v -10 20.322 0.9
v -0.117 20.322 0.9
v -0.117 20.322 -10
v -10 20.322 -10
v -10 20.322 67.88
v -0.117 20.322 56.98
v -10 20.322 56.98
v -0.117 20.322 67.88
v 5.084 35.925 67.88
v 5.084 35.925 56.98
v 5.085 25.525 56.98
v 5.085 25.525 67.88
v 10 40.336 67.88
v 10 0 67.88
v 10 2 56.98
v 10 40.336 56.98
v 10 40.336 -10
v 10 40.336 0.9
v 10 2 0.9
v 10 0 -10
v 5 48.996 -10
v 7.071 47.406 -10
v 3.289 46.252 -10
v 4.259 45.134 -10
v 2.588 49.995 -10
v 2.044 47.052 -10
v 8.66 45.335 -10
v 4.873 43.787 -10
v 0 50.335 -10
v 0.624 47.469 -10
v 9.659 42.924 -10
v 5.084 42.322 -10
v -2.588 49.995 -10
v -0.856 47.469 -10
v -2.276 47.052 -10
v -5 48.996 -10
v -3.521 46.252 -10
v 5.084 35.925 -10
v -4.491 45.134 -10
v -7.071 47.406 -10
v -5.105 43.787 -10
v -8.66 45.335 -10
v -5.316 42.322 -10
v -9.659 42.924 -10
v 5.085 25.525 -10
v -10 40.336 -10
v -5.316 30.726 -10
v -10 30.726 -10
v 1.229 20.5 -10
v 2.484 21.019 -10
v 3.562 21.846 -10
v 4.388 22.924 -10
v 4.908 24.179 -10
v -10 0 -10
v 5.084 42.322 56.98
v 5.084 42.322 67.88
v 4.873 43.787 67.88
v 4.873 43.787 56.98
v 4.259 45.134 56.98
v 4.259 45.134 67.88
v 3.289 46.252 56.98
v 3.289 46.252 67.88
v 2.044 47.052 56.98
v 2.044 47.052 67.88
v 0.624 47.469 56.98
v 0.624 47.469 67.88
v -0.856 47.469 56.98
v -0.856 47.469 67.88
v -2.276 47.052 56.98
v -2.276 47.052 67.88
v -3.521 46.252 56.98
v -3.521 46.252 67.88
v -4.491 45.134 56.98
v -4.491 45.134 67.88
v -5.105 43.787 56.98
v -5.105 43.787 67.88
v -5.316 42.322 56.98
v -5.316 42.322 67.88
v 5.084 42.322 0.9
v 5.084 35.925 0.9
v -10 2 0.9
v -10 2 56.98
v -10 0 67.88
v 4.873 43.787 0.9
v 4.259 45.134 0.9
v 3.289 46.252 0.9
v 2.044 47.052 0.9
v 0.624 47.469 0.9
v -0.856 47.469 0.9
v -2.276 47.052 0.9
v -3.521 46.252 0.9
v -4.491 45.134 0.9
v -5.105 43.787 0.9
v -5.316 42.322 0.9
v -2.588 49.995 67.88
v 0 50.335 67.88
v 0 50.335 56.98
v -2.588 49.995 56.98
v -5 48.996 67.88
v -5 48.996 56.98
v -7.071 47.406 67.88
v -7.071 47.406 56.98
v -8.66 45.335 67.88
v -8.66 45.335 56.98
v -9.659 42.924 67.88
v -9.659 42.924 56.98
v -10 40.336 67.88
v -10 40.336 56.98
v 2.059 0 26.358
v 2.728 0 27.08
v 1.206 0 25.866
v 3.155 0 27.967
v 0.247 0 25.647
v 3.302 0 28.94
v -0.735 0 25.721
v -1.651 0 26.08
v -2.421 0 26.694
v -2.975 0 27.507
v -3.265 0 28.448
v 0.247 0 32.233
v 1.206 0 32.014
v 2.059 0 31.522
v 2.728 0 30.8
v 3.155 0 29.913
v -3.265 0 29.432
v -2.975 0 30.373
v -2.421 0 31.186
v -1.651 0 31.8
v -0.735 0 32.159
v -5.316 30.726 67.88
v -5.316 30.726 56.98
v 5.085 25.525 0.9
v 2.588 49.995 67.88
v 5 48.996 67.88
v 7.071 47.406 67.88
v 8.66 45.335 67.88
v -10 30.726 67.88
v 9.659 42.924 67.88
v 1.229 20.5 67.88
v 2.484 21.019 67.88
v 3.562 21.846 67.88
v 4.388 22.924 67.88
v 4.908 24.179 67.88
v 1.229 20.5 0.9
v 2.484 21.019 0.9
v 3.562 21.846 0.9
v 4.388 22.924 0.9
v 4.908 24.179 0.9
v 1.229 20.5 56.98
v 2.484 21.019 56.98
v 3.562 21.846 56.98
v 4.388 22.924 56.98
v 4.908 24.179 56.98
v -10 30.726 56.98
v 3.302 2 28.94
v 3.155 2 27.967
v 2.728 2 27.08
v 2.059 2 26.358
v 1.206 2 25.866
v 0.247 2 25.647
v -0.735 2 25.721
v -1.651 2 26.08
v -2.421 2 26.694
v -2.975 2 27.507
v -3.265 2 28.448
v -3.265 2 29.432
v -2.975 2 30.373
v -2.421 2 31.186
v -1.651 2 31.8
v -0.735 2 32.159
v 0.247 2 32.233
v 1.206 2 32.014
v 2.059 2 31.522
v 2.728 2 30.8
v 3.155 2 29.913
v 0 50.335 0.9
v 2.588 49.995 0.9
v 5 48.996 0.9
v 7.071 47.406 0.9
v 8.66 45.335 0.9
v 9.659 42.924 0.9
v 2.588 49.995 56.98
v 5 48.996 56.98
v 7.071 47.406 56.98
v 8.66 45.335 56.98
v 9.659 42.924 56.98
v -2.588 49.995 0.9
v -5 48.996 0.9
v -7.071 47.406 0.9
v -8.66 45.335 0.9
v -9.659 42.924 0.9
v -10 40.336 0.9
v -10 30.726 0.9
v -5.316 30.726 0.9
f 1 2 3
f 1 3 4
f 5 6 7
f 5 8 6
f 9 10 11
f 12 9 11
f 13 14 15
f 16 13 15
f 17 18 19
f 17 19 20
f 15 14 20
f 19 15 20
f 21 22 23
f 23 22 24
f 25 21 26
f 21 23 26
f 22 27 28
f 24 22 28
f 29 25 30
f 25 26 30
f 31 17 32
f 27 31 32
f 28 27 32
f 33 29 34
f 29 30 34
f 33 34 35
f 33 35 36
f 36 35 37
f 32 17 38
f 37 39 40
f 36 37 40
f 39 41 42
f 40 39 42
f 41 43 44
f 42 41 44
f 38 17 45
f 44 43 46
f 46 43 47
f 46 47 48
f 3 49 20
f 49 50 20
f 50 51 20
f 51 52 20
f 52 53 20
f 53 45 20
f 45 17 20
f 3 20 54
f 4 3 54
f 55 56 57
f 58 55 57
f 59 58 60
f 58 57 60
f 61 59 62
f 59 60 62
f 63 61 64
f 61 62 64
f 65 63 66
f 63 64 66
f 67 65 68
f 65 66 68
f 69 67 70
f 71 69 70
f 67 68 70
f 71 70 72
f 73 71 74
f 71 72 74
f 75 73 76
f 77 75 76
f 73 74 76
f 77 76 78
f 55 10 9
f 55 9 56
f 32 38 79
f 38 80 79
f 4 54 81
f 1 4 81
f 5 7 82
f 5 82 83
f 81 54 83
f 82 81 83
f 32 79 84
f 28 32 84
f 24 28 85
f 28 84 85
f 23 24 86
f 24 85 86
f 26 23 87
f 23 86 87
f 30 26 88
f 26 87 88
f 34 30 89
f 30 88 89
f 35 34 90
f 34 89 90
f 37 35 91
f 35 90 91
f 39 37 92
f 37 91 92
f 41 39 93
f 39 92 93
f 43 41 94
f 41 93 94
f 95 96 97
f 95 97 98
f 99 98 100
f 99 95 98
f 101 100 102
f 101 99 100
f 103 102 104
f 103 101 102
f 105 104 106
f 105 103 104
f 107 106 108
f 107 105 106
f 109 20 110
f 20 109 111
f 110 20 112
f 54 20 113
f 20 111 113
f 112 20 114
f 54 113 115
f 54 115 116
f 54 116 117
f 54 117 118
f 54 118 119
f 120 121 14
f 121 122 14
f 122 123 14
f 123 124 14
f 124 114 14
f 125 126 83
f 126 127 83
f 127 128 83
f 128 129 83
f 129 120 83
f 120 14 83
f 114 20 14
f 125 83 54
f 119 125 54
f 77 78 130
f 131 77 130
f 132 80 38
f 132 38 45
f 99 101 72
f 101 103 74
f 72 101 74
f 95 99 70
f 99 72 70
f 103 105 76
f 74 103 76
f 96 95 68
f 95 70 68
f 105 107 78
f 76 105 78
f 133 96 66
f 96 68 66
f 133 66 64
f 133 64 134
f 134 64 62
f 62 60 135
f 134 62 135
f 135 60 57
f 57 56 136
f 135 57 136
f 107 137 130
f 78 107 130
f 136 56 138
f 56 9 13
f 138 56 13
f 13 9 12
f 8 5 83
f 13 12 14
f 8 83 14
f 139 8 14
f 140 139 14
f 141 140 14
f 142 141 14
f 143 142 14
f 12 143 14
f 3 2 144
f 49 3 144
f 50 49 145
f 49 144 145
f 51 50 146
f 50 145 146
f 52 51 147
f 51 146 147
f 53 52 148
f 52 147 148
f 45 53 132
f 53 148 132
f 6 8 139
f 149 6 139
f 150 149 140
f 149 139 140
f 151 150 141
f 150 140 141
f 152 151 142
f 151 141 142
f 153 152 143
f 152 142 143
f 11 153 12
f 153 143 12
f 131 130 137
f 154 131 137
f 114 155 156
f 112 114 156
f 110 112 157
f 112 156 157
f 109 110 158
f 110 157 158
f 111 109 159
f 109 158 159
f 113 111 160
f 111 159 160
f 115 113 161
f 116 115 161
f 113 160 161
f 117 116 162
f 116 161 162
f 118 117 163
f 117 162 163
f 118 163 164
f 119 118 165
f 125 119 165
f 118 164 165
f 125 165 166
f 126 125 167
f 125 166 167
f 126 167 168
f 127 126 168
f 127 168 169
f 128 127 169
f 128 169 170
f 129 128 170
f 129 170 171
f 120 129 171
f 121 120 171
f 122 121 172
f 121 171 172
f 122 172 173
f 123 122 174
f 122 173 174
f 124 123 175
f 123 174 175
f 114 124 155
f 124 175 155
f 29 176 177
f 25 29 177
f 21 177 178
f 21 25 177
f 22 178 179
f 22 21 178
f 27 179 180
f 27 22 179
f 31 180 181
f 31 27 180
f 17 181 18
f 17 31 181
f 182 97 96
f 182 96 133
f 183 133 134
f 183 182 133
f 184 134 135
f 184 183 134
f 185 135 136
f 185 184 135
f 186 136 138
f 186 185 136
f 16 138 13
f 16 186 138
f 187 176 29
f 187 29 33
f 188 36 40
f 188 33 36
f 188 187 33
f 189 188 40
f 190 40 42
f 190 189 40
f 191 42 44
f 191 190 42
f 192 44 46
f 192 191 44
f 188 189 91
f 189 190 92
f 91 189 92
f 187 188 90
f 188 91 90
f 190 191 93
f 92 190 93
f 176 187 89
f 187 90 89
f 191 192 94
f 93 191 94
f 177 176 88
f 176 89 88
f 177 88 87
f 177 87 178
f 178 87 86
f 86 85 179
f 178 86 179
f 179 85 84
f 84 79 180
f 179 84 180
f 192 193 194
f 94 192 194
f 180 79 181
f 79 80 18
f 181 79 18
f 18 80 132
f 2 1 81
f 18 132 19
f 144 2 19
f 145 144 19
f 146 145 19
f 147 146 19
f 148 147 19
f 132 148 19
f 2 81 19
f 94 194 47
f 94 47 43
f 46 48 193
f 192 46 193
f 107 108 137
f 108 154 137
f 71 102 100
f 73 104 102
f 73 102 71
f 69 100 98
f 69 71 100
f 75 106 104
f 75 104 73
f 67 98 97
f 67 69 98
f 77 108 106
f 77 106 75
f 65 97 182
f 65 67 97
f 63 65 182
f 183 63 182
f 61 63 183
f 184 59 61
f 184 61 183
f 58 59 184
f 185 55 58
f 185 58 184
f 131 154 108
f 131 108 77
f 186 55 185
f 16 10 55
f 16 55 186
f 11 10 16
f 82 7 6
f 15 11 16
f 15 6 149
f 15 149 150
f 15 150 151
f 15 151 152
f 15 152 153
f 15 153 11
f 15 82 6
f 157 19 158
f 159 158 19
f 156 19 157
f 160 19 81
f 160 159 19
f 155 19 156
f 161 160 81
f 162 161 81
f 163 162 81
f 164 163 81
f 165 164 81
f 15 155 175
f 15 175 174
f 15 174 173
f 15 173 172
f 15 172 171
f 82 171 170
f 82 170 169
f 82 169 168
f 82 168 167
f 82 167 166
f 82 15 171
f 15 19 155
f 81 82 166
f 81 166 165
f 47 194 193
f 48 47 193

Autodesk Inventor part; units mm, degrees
ref_plane "YZ Plane" through (0, 0, 0) normal (1, 0, 0) x (0, 1, 0)
ref_plane "XZ Plane" through (0, 0, 0) normal (0, 1, 0) x (-1, 0, 0)
ref_plane "XY Plane" through (0, 0, 0) normal (0, 0, 1) x (1, 0, 0)
sketch "Sketch1" plane through (0, 0, 0) normal (0, 1, 0) x (-1, 0, 0)
  line L0 (10, 67.88) -> (-10, 67.88)
  line L1 (-10, 67.88) -> (-10, -10)
  line L2 (-10, -10) -> (10, -10)
  line L3 (10, -10) -> (10, 67.88)
  point P0 (0, 0)
  dimension "d0" = 20
  dimension "d1" = 77.88
extrude "Extrusion1" add sketch "Sketch1" along normal blind 2
sketch "Sketch2" plane through (0, 2, 0) normal (0, 1, 0) x (1, 0, 0)
  line L0 (-10, -67.88) -> (10, -67.88) projected
  line L1 (0, -67.88) -> (-6.35, -67.88)
  line L2 (-6.35, -56.98) -> (6.35, -56.98)
  line L3 (6.35, -67.88) -> (0, -67.88)
  line L4 (10, 10) -> (-10, 10) projected
  line L5 (-6.35, -0.9) -> (6.35, -0.9)
  line L6 (-6.35, 10) -> (6.35, 10)
  line L7 (-6.35, -67.88) -> (-10, -67.88)
  line L8 (-10, 10) -> (-10, -67.88) projected
  line L9 (-10, -56.98) -> (-6.35, -56.98)
  line L10 (6.35, -67.88) -> (10, -67.88)
  line L11 (10, -67.88) -> (10, 10) projected
  line L12 (10, -56.98) -> (6.35, -56.98)
  line L13 (6.35, -0.9) -> (10, -0.9)
  line L14 (10, 10) -> (6.35, 10)
  line L15 (10, -0.9) -> (10, 10)
  line L16 (10, -67.88) -> (10, -56.98)
  line L17 (-10, -67.88) -> (-10, -56.98)
  line L18 (-6.35, -0.9) -> (-10, -0.9)
  line L19 (-10, -0.9) -> (-10, 10)
  line L20 (-10, 10) -> (-6.35, 10)
  point P0 (0, 0)
  dimension "d4" = 6.35
  dimension "d5" = 10.9
  dimension "d6" = 12.7
  dimension "d7" = 10.9
extrude "Extrusion2" add sketch "Sketch2" along normal blind 48.3354 contours L8 L9 L2 L12 L11 L0 | L8 L4 L11 L13 L5 L18
sketch "Sketch9" plane through (-10, 0, 67.88) normal (0, 0, 1) x (1, 0, 0)
  arc A0 (15.084, 42.3223) -> (4.684, 42.3223) centre (9.884, 42.3223) ccw
  line L0 (15.084, 35.9247) -> (15.084, 42.3223)
  line L1 (4.684, 41.1247) -> (4.684, 42.3223)
  arc A1 (15.084, 42.3223) -> (4.684, 42.3223) centre (9.884, 42.3223) ccw
  line L2 (4.684, 42.3223) -> (4.684, 35.9247)
  line L3 (9.8827, 20.3222) -> (-0.0013, 20.3222)
  line L4 (-0.0013, 30.726) -> (-0.0013, 20.3222)
  line L5 (4.684, 35.9247) -> (4.684, 30.726)
  line L6 (15.084, 35.9247) -> (15.0853, 25.5254)
  arc A2 (15.084, 35.9247) -> (15.084, 35.9251) centre (9.884, 35.9243) ccw
  line L7 (4.684, 30.726) -> (-0.0013, 30.726)
  arc A3 (9.8827, 20.3222) -> (15.0853, 25.5254) centre (9.8827, 25.5248) ccw
  point P0 (10, 0)
fillet "Fillet4" radius 10 4 edges at (10, 50.3354, 62.43) (-10, 50.3354, 62.43) (-10, 50.3354, -4.55) (10, 50.3354, -4.55)
sketch "Sketch10" plane through (0, 2, 0) normal (0, 1, 0) x (1, 0, 0)
  line L0 (10, -67.88) -> (-10, -67.88) projected
  line L1 (-10, 10) -> (10, 10) projected
  line L2 (10, -56.98) -> (10, -0.9) projected
  line L3 (-10, -0.9) -> (-10, -56.98) projected
  line L4 (10, -28.94) -> (-10, -28.94)
  circle A0 centre (0, -28.94) radius 3.302
  point P0 (0, 0)
  dimension "d53" = 77.88
  dimension "d54" = 6.604
extrude "Extrusion10" cut sketch "Sketch10" against normal blind 2
extrude "Extrusion11" cut sketch "Sketch9" against normal through all
properties part number "6 Backet Adjustment"
